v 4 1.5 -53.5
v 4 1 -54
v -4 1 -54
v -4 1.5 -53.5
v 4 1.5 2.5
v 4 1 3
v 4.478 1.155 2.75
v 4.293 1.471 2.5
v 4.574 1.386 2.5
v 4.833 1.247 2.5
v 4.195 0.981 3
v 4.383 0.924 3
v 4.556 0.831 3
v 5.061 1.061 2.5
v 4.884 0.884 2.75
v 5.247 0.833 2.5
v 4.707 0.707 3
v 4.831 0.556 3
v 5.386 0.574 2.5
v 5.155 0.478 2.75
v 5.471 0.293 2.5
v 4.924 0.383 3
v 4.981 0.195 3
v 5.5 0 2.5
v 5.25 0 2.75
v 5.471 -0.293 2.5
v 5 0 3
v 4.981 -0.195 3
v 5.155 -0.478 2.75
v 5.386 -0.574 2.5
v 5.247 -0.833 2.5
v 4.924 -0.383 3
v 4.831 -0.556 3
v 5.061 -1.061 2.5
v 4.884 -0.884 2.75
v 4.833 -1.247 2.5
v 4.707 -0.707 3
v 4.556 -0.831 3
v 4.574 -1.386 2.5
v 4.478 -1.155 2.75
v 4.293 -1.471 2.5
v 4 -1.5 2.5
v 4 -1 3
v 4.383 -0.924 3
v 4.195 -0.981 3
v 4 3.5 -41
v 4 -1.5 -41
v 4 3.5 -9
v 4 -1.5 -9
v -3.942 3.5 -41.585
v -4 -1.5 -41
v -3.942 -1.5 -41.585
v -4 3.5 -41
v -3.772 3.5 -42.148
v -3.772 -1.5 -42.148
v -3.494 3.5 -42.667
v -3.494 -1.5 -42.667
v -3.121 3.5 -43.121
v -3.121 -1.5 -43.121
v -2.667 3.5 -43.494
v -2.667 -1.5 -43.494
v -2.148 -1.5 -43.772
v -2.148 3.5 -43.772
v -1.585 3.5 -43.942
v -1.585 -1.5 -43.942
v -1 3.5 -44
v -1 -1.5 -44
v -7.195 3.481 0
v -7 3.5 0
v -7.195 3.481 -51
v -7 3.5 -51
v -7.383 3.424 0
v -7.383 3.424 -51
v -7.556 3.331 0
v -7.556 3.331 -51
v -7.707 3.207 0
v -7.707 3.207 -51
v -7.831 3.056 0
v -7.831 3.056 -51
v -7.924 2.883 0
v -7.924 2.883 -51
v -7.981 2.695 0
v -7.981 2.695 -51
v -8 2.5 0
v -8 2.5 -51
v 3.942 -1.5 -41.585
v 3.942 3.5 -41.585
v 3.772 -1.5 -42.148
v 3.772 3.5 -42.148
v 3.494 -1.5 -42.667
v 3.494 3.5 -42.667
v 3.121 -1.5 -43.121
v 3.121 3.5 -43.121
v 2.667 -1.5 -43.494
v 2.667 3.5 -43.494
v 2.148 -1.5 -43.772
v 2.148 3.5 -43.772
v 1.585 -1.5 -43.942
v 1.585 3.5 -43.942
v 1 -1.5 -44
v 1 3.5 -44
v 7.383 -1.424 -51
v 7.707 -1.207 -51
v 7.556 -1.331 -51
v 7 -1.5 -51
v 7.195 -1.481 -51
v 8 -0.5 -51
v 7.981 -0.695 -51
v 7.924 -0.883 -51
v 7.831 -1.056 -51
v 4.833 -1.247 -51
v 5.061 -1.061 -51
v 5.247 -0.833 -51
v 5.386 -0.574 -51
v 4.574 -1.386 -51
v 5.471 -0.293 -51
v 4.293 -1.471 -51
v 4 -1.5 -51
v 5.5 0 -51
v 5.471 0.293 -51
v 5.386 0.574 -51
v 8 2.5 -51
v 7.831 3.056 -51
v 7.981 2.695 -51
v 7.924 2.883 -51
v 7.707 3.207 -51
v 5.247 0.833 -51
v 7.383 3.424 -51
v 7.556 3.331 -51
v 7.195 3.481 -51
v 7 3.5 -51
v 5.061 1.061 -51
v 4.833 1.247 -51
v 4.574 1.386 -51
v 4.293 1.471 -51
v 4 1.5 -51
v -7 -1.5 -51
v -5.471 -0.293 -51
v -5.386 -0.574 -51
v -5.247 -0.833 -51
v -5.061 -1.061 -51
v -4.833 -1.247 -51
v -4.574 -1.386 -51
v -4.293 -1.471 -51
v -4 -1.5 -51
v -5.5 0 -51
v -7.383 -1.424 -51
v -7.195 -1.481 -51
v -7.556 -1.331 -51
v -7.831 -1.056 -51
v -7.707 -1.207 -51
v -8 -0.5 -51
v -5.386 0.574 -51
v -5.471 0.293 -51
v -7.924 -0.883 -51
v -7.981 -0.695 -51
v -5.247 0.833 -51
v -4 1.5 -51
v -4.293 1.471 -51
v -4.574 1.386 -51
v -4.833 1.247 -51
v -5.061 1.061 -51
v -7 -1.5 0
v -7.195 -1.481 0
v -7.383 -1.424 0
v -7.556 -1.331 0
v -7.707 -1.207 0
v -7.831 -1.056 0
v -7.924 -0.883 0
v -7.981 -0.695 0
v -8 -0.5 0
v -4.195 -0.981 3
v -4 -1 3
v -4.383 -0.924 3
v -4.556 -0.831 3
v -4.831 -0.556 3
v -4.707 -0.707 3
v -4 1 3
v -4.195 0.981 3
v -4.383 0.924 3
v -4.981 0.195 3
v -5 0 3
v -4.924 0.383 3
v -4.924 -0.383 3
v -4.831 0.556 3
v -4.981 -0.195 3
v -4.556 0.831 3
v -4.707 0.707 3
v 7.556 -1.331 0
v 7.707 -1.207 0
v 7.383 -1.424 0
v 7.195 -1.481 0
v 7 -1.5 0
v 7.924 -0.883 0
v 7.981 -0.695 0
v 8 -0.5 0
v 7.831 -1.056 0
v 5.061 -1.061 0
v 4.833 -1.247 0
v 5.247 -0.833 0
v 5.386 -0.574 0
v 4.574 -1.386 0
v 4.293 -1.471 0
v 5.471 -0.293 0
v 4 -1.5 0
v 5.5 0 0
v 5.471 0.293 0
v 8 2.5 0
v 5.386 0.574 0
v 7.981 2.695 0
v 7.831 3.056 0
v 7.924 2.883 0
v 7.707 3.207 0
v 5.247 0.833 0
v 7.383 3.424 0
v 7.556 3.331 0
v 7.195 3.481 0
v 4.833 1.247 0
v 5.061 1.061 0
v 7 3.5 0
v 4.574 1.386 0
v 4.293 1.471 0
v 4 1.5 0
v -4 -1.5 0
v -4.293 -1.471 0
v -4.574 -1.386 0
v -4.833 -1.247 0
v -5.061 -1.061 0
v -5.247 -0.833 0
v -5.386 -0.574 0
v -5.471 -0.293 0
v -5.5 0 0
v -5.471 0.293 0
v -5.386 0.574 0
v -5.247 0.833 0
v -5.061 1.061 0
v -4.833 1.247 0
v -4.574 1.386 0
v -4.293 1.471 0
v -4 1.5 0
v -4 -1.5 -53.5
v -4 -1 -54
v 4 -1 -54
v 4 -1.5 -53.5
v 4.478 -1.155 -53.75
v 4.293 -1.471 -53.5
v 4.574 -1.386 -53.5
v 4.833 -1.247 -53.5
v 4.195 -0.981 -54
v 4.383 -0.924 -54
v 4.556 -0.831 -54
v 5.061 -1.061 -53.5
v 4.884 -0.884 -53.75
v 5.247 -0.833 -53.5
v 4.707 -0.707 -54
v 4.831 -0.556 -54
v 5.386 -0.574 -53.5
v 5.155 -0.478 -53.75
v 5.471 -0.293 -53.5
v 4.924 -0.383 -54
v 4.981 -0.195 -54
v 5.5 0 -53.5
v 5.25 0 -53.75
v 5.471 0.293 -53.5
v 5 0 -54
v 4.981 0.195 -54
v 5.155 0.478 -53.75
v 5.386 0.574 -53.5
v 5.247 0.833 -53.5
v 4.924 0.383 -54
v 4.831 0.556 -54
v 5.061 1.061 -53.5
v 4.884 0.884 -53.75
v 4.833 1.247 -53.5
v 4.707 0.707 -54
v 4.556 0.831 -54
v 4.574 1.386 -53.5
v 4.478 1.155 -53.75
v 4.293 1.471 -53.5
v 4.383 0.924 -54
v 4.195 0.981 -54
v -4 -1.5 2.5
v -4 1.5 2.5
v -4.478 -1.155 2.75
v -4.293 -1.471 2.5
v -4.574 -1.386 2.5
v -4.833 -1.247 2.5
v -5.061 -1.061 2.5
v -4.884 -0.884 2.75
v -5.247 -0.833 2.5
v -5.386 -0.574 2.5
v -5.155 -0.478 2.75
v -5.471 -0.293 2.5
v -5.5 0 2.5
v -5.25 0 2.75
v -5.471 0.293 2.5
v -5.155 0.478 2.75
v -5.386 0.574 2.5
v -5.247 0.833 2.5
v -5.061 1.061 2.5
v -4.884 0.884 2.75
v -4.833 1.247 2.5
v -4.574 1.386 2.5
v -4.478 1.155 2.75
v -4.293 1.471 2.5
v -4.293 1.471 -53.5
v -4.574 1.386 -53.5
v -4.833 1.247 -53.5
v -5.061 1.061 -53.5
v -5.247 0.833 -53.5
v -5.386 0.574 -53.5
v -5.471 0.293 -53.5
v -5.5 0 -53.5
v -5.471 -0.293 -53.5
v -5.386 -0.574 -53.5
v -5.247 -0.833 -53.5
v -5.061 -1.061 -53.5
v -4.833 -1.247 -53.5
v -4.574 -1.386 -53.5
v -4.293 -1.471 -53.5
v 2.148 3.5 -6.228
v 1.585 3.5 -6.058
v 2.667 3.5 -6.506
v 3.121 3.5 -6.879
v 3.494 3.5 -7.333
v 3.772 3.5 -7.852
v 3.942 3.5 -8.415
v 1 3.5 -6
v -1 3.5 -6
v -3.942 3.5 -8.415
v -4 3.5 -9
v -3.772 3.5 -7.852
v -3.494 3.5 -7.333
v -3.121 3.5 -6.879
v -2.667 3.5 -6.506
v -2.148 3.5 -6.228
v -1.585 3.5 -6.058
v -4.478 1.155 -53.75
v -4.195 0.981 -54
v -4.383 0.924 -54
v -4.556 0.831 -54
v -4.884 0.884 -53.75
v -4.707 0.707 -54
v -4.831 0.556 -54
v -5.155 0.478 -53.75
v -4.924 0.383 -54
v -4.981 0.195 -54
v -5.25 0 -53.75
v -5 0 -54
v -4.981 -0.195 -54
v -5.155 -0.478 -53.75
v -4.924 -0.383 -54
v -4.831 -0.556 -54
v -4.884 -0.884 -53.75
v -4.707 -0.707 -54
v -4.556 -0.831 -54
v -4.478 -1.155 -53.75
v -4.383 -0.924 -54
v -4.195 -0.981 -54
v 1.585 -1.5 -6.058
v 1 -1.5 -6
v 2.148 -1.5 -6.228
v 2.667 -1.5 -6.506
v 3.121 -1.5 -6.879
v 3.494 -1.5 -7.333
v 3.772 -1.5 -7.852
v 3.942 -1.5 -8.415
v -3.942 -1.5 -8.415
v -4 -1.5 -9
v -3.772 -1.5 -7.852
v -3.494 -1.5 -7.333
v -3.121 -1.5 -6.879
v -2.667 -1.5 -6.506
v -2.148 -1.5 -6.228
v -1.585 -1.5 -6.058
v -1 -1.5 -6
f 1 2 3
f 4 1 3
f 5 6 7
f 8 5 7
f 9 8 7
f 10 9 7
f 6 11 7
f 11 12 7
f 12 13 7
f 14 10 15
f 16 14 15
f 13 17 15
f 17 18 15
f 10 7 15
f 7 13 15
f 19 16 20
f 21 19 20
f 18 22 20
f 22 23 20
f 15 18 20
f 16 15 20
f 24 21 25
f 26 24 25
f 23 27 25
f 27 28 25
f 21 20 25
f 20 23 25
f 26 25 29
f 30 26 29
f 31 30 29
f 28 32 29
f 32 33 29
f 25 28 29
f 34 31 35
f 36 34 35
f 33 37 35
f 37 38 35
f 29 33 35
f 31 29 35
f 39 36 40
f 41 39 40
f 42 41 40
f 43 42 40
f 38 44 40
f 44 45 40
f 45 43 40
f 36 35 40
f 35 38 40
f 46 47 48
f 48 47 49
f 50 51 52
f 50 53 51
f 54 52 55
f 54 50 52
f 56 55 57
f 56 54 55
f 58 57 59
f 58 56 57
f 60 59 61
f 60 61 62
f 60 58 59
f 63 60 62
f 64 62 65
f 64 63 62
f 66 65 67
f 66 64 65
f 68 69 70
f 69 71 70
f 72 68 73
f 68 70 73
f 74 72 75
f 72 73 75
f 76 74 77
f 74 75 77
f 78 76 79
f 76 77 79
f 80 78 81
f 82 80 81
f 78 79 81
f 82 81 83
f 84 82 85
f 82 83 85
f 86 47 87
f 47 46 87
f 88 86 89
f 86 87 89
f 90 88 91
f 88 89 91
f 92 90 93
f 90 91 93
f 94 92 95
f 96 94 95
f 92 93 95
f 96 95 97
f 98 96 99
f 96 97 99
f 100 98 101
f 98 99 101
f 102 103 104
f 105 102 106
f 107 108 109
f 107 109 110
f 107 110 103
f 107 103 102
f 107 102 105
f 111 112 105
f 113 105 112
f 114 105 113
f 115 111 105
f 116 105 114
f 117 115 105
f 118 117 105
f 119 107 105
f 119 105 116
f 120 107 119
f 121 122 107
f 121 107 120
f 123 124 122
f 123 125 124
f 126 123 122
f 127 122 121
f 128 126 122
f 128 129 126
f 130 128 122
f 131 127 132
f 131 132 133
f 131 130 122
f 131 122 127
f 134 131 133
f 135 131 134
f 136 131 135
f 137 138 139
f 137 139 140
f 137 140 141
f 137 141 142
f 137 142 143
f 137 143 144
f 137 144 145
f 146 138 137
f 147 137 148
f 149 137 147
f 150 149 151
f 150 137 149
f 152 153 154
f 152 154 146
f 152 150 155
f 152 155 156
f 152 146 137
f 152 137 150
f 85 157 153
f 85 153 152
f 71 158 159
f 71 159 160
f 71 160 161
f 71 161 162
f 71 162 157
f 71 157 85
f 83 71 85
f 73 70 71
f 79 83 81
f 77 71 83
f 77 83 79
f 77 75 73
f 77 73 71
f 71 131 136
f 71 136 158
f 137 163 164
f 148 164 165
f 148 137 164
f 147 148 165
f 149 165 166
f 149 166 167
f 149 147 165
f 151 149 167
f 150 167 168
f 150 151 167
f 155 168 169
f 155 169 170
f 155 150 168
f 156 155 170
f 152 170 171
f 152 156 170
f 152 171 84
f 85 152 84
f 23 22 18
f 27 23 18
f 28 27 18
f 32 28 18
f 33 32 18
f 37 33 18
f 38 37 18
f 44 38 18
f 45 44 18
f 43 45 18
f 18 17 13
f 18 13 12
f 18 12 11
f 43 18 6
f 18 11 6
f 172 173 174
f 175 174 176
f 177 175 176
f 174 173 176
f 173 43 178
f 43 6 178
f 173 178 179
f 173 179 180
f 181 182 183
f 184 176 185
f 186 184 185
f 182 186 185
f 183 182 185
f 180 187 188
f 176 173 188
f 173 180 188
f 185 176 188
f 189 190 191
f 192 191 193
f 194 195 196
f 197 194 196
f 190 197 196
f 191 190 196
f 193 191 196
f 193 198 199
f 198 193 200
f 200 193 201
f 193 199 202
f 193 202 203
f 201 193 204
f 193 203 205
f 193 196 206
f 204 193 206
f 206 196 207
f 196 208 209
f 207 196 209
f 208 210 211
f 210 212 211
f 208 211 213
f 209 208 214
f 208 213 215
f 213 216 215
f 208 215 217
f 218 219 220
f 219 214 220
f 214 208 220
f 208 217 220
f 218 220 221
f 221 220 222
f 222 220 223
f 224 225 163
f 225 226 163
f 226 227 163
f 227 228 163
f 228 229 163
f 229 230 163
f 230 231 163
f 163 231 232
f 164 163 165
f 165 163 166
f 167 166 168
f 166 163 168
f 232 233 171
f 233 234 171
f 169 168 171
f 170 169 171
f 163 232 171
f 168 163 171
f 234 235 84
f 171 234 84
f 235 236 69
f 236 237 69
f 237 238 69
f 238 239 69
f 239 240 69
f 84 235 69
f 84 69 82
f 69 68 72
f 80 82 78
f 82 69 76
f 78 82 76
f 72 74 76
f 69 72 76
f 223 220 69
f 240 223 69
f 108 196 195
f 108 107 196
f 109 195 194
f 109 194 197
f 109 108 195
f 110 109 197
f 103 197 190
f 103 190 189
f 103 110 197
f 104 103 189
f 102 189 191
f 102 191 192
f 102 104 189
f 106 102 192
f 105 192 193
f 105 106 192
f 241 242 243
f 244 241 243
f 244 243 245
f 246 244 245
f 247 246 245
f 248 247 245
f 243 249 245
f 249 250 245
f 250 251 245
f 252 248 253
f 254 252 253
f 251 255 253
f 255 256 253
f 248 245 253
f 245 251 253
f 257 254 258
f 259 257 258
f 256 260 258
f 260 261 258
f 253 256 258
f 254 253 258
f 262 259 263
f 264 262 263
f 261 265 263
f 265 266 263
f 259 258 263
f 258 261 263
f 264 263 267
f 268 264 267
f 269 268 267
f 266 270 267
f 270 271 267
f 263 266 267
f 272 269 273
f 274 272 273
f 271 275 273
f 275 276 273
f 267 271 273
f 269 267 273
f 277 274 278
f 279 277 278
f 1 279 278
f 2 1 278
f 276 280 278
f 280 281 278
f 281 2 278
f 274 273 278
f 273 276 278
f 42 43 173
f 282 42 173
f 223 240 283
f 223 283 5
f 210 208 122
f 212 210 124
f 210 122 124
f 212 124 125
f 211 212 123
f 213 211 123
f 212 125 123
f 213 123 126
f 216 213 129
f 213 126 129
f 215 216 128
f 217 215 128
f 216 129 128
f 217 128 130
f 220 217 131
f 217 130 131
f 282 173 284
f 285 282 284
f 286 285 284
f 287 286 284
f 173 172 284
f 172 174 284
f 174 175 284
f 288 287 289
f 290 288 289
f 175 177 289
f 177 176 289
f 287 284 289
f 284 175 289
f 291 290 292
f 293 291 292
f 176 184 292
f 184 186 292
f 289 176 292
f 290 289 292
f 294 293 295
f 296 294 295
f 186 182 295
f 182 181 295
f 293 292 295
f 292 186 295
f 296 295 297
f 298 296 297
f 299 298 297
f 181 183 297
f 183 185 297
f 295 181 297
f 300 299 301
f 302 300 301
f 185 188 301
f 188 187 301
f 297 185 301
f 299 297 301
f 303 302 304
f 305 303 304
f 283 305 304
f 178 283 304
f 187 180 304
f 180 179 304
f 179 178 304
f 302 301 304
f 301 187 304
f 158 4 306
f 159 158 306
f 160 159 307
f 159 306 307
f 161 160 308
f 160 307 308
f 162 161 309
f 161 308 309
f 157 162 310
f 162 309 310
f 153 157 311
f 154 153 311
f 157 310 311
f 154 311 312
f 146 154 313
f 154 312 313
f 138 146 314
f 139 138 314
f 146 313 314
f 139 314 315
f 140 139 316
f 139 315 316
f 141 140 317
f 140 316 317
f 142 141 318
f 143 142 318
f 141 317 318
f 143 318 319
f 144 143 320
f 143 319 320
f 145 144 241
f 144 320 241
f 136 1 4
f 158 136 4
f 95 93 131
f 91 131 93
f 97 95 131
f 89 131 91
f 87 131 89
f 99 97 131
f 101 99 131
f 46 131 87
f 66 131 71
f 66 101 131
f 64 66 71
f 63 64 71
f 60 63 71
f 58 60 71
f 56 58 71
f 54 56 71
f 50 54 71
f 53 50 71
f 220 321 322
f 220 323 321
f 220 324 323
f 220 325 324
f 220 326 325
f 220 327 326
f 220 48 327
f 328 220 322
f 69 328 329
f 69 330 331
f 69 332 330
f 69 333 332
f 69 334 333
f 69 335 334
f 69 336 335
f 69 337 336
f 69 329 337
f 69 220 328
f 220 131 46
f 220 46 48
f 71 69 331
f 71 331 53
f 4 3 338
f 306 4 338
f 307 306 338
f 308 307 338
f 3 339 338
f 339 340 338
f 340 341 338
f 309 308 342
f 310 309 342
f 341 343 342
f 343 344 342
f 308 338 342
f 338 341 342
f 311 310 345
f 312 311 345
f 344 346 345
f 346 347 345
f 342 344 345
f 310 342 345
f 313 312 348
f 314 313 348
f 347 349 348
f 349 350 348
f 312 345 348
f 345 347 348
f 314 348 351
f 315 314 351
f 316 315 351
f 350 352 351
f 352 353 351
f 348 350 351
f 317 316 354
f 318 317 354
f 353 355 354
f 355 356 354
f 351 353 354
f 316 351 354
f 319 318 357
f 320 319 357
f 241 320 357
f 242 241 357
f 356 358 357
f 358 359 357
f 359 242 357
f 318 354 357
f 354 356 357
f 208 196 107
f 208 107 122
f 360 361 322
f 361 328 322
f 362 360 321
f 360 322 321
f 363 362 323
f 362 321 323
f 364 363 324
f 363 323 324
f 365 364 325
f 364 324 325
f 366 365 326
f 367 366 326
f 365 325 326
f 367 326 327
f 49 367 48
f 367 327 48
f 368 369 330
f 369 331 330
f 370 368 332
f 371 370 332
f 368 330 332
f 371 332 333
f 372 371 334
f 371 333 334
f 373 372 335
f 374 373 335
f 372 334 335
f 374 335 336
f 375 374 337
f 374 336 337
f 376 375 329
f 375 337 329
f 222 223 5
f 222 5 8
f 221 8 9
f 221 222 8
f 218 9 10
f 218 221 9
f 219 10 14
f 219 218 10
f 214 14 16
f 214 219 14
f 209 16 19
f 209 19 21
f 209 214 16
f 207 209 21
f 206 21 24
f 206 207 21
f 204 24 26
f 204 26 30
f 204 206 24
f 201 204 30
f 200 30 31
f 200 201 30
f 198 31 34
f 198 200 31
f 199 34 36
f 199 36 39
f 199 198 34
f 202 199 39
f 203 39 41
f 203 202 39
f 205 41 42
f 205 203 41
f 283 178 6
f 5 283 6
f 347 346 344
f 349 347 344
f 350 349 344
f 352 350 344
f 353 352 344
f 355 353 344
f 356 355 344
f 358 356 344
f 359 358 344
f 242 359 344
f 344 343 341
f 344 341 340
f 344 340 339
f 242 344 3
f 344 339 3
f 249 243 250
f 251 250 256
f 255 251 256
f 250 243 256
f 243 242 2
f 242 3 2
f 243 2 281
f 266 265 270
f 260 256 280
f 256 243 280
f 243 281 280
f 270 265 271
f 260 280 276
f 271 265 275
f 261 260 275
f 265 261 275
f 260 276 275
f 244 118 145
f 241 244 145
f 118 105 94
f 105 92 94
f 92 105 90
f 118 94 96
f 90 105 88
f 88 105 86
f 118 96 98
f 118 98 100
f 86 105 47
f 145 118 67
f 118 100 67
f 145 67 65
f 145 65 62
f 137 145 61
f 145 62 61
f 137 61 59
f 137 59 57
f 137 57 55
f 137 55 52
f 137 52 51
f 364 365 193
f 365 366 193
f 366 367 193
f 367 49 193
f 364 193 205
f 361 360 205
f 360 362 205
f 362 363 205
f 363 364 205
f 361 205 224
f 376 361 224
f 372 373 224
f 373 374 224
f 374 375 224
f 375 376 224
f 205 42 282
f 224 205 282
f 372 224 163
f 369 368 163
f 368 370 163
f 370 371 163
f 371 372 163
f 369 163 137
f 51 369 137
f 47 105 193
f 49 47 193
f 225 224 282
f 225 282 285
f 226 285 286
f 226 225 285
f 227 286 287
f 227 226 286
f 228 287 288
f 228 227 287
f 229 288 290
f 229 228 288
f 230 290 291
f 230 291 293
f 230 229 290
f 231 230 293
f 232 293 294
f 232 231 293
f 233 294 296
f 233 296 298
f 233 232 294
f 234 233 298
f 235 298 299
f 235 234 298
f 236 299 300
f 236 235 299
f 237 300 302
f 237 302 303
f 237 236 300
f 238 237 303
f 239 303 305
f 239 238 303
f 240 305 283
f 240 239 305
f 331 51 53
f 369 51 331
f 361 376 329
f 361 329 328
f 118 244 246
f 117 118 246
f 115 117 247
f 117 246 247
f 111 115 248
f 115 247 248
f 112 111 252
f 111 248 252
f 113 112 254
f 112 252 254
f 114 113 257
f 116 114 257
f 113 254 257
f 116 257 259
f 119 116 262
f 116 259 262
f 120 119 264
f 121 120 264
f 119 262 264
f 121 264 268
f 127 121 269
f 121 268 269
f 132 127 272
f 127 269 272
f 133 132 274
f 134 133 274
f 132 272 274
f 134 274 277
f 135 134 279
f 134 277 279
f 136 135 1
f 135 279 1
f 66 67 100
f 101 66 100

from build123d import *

# Parameters (mm, degrees)
EXTRUDE_1_DEPTH     = 3
SKETCH_2_W          = 16
SKETCH_2_H          = 5
EXTRUDE_2_DEPTH     = 51
EXTRUDE_START       = 3
EXTRUDE_3_DEPTH     = 3
FILLET_1_R          = 1
CHAMFER_1_SIZE      = 0.5
SKETCH_4_W          = 8
SKETCH_4_H          = 38
CUT_EXTRUDE_1_DEPTH = 55.817880295
FILLET_2_R          = 3


with BuildPart() as part:
    # 草图1 → 凸台-拉伸1 (new body)
    with BuildSketch(Plane.XY):
        with BuildLine():
            Line((-4, 1.5), (4, 1.5))
            ThreePointArc((4, 1.5), (5.5, 0), (4, -1.5))
            Line((4, -1.5), (-4, -1.5))
            ThreePointArc((-4, -1.5), (-5.5, 0), (-4, 1.5))
        make_face()
    extrude(amount=EXTRUDE_1_DEPTH)

    # 草图2 → 凸台-拉伸2 (add)
    with BuildSketch(Plane(origin=(0, 0, 0), x_dir=(-1, 0, 0), z_dir=(0, 0, -1))):
        with Locations((0, 1)):
            Rectangle(SKETCH_2_W, SKETCH_2_H)
    extrude(amount=EXTRUDE_2_DEPTH)

    # 草图3 → 凸台-拉伸3 (add)
    with BuildSketch(Plane(origin=(0, 0, -51), x_dir=(-1, 0, 0), z_dir=(0, 0, -1)).offset(EXTRUDE_START)):
        with BuildLine():
            Line((-4, 1.5), (4, 1.5))
            ThreePointArc((4, 1.5), (5.5, 0), (4, -1.5))
            Line((4, -1.5), (-4, -1.5))
            ThreePointArc((-4, -1.5), (-5.5, 0), (-4, 1.5))
        make_face()
    extrude(amount=-EXTRUDE_3_DEPTH)

    # 圆角1
    fillet_1_edges = [part.edges().sort_by_distance(p)[0] for p in [
        (-8, -1.5, -25.5),
        (-8, 3.5, -25.5),
        (8, 3.5, -25.5),
        (8, -1.5, -25.5),
    ]]
    fillet(fillet_1_edges, radius=FILLET_1_R)

    # 倒角1
    chamfer_1_edges = [part.edges().sort_by_distance(p)[0] for p in [
        (5.5, 0, 3),
        (0, 1.5, 3),
        (5.5, 0, -54),
        (0, -1.5, -54),
        (-5.5, 0, -54),
        (0, 1.5, -54),
        (-5.5, 0, 3),
        (0, -1.5, 3),
    ]]
    chamfer(chamfer_1_edges, length=CHAMFER_1_SIZE)

    # 草图4 → 切除-拉伸1 (cut, through all)
    with BuildSketch(Plane.XZ.offset(1.5)):
        with Locations((0, -25)):
            Rectangle(SKETCH_4_W, SKETCH_4_H)
    extrude(amount=-CUT_EXTRUDE_1_DEPTH, mode=Mode.SUBTRACT)

    # 圆角2
    fillet_2_edges = [part.edges().sort_by_distance(p)[0] for p in [
        (4, 1, -6),
        (4, 1, -44),
        (-4, 1, -44),
        (-4, 1, -6),
    ]]
    fillet(fillet_2_edges, radius=FILLET_2_R)


solid = part.part
